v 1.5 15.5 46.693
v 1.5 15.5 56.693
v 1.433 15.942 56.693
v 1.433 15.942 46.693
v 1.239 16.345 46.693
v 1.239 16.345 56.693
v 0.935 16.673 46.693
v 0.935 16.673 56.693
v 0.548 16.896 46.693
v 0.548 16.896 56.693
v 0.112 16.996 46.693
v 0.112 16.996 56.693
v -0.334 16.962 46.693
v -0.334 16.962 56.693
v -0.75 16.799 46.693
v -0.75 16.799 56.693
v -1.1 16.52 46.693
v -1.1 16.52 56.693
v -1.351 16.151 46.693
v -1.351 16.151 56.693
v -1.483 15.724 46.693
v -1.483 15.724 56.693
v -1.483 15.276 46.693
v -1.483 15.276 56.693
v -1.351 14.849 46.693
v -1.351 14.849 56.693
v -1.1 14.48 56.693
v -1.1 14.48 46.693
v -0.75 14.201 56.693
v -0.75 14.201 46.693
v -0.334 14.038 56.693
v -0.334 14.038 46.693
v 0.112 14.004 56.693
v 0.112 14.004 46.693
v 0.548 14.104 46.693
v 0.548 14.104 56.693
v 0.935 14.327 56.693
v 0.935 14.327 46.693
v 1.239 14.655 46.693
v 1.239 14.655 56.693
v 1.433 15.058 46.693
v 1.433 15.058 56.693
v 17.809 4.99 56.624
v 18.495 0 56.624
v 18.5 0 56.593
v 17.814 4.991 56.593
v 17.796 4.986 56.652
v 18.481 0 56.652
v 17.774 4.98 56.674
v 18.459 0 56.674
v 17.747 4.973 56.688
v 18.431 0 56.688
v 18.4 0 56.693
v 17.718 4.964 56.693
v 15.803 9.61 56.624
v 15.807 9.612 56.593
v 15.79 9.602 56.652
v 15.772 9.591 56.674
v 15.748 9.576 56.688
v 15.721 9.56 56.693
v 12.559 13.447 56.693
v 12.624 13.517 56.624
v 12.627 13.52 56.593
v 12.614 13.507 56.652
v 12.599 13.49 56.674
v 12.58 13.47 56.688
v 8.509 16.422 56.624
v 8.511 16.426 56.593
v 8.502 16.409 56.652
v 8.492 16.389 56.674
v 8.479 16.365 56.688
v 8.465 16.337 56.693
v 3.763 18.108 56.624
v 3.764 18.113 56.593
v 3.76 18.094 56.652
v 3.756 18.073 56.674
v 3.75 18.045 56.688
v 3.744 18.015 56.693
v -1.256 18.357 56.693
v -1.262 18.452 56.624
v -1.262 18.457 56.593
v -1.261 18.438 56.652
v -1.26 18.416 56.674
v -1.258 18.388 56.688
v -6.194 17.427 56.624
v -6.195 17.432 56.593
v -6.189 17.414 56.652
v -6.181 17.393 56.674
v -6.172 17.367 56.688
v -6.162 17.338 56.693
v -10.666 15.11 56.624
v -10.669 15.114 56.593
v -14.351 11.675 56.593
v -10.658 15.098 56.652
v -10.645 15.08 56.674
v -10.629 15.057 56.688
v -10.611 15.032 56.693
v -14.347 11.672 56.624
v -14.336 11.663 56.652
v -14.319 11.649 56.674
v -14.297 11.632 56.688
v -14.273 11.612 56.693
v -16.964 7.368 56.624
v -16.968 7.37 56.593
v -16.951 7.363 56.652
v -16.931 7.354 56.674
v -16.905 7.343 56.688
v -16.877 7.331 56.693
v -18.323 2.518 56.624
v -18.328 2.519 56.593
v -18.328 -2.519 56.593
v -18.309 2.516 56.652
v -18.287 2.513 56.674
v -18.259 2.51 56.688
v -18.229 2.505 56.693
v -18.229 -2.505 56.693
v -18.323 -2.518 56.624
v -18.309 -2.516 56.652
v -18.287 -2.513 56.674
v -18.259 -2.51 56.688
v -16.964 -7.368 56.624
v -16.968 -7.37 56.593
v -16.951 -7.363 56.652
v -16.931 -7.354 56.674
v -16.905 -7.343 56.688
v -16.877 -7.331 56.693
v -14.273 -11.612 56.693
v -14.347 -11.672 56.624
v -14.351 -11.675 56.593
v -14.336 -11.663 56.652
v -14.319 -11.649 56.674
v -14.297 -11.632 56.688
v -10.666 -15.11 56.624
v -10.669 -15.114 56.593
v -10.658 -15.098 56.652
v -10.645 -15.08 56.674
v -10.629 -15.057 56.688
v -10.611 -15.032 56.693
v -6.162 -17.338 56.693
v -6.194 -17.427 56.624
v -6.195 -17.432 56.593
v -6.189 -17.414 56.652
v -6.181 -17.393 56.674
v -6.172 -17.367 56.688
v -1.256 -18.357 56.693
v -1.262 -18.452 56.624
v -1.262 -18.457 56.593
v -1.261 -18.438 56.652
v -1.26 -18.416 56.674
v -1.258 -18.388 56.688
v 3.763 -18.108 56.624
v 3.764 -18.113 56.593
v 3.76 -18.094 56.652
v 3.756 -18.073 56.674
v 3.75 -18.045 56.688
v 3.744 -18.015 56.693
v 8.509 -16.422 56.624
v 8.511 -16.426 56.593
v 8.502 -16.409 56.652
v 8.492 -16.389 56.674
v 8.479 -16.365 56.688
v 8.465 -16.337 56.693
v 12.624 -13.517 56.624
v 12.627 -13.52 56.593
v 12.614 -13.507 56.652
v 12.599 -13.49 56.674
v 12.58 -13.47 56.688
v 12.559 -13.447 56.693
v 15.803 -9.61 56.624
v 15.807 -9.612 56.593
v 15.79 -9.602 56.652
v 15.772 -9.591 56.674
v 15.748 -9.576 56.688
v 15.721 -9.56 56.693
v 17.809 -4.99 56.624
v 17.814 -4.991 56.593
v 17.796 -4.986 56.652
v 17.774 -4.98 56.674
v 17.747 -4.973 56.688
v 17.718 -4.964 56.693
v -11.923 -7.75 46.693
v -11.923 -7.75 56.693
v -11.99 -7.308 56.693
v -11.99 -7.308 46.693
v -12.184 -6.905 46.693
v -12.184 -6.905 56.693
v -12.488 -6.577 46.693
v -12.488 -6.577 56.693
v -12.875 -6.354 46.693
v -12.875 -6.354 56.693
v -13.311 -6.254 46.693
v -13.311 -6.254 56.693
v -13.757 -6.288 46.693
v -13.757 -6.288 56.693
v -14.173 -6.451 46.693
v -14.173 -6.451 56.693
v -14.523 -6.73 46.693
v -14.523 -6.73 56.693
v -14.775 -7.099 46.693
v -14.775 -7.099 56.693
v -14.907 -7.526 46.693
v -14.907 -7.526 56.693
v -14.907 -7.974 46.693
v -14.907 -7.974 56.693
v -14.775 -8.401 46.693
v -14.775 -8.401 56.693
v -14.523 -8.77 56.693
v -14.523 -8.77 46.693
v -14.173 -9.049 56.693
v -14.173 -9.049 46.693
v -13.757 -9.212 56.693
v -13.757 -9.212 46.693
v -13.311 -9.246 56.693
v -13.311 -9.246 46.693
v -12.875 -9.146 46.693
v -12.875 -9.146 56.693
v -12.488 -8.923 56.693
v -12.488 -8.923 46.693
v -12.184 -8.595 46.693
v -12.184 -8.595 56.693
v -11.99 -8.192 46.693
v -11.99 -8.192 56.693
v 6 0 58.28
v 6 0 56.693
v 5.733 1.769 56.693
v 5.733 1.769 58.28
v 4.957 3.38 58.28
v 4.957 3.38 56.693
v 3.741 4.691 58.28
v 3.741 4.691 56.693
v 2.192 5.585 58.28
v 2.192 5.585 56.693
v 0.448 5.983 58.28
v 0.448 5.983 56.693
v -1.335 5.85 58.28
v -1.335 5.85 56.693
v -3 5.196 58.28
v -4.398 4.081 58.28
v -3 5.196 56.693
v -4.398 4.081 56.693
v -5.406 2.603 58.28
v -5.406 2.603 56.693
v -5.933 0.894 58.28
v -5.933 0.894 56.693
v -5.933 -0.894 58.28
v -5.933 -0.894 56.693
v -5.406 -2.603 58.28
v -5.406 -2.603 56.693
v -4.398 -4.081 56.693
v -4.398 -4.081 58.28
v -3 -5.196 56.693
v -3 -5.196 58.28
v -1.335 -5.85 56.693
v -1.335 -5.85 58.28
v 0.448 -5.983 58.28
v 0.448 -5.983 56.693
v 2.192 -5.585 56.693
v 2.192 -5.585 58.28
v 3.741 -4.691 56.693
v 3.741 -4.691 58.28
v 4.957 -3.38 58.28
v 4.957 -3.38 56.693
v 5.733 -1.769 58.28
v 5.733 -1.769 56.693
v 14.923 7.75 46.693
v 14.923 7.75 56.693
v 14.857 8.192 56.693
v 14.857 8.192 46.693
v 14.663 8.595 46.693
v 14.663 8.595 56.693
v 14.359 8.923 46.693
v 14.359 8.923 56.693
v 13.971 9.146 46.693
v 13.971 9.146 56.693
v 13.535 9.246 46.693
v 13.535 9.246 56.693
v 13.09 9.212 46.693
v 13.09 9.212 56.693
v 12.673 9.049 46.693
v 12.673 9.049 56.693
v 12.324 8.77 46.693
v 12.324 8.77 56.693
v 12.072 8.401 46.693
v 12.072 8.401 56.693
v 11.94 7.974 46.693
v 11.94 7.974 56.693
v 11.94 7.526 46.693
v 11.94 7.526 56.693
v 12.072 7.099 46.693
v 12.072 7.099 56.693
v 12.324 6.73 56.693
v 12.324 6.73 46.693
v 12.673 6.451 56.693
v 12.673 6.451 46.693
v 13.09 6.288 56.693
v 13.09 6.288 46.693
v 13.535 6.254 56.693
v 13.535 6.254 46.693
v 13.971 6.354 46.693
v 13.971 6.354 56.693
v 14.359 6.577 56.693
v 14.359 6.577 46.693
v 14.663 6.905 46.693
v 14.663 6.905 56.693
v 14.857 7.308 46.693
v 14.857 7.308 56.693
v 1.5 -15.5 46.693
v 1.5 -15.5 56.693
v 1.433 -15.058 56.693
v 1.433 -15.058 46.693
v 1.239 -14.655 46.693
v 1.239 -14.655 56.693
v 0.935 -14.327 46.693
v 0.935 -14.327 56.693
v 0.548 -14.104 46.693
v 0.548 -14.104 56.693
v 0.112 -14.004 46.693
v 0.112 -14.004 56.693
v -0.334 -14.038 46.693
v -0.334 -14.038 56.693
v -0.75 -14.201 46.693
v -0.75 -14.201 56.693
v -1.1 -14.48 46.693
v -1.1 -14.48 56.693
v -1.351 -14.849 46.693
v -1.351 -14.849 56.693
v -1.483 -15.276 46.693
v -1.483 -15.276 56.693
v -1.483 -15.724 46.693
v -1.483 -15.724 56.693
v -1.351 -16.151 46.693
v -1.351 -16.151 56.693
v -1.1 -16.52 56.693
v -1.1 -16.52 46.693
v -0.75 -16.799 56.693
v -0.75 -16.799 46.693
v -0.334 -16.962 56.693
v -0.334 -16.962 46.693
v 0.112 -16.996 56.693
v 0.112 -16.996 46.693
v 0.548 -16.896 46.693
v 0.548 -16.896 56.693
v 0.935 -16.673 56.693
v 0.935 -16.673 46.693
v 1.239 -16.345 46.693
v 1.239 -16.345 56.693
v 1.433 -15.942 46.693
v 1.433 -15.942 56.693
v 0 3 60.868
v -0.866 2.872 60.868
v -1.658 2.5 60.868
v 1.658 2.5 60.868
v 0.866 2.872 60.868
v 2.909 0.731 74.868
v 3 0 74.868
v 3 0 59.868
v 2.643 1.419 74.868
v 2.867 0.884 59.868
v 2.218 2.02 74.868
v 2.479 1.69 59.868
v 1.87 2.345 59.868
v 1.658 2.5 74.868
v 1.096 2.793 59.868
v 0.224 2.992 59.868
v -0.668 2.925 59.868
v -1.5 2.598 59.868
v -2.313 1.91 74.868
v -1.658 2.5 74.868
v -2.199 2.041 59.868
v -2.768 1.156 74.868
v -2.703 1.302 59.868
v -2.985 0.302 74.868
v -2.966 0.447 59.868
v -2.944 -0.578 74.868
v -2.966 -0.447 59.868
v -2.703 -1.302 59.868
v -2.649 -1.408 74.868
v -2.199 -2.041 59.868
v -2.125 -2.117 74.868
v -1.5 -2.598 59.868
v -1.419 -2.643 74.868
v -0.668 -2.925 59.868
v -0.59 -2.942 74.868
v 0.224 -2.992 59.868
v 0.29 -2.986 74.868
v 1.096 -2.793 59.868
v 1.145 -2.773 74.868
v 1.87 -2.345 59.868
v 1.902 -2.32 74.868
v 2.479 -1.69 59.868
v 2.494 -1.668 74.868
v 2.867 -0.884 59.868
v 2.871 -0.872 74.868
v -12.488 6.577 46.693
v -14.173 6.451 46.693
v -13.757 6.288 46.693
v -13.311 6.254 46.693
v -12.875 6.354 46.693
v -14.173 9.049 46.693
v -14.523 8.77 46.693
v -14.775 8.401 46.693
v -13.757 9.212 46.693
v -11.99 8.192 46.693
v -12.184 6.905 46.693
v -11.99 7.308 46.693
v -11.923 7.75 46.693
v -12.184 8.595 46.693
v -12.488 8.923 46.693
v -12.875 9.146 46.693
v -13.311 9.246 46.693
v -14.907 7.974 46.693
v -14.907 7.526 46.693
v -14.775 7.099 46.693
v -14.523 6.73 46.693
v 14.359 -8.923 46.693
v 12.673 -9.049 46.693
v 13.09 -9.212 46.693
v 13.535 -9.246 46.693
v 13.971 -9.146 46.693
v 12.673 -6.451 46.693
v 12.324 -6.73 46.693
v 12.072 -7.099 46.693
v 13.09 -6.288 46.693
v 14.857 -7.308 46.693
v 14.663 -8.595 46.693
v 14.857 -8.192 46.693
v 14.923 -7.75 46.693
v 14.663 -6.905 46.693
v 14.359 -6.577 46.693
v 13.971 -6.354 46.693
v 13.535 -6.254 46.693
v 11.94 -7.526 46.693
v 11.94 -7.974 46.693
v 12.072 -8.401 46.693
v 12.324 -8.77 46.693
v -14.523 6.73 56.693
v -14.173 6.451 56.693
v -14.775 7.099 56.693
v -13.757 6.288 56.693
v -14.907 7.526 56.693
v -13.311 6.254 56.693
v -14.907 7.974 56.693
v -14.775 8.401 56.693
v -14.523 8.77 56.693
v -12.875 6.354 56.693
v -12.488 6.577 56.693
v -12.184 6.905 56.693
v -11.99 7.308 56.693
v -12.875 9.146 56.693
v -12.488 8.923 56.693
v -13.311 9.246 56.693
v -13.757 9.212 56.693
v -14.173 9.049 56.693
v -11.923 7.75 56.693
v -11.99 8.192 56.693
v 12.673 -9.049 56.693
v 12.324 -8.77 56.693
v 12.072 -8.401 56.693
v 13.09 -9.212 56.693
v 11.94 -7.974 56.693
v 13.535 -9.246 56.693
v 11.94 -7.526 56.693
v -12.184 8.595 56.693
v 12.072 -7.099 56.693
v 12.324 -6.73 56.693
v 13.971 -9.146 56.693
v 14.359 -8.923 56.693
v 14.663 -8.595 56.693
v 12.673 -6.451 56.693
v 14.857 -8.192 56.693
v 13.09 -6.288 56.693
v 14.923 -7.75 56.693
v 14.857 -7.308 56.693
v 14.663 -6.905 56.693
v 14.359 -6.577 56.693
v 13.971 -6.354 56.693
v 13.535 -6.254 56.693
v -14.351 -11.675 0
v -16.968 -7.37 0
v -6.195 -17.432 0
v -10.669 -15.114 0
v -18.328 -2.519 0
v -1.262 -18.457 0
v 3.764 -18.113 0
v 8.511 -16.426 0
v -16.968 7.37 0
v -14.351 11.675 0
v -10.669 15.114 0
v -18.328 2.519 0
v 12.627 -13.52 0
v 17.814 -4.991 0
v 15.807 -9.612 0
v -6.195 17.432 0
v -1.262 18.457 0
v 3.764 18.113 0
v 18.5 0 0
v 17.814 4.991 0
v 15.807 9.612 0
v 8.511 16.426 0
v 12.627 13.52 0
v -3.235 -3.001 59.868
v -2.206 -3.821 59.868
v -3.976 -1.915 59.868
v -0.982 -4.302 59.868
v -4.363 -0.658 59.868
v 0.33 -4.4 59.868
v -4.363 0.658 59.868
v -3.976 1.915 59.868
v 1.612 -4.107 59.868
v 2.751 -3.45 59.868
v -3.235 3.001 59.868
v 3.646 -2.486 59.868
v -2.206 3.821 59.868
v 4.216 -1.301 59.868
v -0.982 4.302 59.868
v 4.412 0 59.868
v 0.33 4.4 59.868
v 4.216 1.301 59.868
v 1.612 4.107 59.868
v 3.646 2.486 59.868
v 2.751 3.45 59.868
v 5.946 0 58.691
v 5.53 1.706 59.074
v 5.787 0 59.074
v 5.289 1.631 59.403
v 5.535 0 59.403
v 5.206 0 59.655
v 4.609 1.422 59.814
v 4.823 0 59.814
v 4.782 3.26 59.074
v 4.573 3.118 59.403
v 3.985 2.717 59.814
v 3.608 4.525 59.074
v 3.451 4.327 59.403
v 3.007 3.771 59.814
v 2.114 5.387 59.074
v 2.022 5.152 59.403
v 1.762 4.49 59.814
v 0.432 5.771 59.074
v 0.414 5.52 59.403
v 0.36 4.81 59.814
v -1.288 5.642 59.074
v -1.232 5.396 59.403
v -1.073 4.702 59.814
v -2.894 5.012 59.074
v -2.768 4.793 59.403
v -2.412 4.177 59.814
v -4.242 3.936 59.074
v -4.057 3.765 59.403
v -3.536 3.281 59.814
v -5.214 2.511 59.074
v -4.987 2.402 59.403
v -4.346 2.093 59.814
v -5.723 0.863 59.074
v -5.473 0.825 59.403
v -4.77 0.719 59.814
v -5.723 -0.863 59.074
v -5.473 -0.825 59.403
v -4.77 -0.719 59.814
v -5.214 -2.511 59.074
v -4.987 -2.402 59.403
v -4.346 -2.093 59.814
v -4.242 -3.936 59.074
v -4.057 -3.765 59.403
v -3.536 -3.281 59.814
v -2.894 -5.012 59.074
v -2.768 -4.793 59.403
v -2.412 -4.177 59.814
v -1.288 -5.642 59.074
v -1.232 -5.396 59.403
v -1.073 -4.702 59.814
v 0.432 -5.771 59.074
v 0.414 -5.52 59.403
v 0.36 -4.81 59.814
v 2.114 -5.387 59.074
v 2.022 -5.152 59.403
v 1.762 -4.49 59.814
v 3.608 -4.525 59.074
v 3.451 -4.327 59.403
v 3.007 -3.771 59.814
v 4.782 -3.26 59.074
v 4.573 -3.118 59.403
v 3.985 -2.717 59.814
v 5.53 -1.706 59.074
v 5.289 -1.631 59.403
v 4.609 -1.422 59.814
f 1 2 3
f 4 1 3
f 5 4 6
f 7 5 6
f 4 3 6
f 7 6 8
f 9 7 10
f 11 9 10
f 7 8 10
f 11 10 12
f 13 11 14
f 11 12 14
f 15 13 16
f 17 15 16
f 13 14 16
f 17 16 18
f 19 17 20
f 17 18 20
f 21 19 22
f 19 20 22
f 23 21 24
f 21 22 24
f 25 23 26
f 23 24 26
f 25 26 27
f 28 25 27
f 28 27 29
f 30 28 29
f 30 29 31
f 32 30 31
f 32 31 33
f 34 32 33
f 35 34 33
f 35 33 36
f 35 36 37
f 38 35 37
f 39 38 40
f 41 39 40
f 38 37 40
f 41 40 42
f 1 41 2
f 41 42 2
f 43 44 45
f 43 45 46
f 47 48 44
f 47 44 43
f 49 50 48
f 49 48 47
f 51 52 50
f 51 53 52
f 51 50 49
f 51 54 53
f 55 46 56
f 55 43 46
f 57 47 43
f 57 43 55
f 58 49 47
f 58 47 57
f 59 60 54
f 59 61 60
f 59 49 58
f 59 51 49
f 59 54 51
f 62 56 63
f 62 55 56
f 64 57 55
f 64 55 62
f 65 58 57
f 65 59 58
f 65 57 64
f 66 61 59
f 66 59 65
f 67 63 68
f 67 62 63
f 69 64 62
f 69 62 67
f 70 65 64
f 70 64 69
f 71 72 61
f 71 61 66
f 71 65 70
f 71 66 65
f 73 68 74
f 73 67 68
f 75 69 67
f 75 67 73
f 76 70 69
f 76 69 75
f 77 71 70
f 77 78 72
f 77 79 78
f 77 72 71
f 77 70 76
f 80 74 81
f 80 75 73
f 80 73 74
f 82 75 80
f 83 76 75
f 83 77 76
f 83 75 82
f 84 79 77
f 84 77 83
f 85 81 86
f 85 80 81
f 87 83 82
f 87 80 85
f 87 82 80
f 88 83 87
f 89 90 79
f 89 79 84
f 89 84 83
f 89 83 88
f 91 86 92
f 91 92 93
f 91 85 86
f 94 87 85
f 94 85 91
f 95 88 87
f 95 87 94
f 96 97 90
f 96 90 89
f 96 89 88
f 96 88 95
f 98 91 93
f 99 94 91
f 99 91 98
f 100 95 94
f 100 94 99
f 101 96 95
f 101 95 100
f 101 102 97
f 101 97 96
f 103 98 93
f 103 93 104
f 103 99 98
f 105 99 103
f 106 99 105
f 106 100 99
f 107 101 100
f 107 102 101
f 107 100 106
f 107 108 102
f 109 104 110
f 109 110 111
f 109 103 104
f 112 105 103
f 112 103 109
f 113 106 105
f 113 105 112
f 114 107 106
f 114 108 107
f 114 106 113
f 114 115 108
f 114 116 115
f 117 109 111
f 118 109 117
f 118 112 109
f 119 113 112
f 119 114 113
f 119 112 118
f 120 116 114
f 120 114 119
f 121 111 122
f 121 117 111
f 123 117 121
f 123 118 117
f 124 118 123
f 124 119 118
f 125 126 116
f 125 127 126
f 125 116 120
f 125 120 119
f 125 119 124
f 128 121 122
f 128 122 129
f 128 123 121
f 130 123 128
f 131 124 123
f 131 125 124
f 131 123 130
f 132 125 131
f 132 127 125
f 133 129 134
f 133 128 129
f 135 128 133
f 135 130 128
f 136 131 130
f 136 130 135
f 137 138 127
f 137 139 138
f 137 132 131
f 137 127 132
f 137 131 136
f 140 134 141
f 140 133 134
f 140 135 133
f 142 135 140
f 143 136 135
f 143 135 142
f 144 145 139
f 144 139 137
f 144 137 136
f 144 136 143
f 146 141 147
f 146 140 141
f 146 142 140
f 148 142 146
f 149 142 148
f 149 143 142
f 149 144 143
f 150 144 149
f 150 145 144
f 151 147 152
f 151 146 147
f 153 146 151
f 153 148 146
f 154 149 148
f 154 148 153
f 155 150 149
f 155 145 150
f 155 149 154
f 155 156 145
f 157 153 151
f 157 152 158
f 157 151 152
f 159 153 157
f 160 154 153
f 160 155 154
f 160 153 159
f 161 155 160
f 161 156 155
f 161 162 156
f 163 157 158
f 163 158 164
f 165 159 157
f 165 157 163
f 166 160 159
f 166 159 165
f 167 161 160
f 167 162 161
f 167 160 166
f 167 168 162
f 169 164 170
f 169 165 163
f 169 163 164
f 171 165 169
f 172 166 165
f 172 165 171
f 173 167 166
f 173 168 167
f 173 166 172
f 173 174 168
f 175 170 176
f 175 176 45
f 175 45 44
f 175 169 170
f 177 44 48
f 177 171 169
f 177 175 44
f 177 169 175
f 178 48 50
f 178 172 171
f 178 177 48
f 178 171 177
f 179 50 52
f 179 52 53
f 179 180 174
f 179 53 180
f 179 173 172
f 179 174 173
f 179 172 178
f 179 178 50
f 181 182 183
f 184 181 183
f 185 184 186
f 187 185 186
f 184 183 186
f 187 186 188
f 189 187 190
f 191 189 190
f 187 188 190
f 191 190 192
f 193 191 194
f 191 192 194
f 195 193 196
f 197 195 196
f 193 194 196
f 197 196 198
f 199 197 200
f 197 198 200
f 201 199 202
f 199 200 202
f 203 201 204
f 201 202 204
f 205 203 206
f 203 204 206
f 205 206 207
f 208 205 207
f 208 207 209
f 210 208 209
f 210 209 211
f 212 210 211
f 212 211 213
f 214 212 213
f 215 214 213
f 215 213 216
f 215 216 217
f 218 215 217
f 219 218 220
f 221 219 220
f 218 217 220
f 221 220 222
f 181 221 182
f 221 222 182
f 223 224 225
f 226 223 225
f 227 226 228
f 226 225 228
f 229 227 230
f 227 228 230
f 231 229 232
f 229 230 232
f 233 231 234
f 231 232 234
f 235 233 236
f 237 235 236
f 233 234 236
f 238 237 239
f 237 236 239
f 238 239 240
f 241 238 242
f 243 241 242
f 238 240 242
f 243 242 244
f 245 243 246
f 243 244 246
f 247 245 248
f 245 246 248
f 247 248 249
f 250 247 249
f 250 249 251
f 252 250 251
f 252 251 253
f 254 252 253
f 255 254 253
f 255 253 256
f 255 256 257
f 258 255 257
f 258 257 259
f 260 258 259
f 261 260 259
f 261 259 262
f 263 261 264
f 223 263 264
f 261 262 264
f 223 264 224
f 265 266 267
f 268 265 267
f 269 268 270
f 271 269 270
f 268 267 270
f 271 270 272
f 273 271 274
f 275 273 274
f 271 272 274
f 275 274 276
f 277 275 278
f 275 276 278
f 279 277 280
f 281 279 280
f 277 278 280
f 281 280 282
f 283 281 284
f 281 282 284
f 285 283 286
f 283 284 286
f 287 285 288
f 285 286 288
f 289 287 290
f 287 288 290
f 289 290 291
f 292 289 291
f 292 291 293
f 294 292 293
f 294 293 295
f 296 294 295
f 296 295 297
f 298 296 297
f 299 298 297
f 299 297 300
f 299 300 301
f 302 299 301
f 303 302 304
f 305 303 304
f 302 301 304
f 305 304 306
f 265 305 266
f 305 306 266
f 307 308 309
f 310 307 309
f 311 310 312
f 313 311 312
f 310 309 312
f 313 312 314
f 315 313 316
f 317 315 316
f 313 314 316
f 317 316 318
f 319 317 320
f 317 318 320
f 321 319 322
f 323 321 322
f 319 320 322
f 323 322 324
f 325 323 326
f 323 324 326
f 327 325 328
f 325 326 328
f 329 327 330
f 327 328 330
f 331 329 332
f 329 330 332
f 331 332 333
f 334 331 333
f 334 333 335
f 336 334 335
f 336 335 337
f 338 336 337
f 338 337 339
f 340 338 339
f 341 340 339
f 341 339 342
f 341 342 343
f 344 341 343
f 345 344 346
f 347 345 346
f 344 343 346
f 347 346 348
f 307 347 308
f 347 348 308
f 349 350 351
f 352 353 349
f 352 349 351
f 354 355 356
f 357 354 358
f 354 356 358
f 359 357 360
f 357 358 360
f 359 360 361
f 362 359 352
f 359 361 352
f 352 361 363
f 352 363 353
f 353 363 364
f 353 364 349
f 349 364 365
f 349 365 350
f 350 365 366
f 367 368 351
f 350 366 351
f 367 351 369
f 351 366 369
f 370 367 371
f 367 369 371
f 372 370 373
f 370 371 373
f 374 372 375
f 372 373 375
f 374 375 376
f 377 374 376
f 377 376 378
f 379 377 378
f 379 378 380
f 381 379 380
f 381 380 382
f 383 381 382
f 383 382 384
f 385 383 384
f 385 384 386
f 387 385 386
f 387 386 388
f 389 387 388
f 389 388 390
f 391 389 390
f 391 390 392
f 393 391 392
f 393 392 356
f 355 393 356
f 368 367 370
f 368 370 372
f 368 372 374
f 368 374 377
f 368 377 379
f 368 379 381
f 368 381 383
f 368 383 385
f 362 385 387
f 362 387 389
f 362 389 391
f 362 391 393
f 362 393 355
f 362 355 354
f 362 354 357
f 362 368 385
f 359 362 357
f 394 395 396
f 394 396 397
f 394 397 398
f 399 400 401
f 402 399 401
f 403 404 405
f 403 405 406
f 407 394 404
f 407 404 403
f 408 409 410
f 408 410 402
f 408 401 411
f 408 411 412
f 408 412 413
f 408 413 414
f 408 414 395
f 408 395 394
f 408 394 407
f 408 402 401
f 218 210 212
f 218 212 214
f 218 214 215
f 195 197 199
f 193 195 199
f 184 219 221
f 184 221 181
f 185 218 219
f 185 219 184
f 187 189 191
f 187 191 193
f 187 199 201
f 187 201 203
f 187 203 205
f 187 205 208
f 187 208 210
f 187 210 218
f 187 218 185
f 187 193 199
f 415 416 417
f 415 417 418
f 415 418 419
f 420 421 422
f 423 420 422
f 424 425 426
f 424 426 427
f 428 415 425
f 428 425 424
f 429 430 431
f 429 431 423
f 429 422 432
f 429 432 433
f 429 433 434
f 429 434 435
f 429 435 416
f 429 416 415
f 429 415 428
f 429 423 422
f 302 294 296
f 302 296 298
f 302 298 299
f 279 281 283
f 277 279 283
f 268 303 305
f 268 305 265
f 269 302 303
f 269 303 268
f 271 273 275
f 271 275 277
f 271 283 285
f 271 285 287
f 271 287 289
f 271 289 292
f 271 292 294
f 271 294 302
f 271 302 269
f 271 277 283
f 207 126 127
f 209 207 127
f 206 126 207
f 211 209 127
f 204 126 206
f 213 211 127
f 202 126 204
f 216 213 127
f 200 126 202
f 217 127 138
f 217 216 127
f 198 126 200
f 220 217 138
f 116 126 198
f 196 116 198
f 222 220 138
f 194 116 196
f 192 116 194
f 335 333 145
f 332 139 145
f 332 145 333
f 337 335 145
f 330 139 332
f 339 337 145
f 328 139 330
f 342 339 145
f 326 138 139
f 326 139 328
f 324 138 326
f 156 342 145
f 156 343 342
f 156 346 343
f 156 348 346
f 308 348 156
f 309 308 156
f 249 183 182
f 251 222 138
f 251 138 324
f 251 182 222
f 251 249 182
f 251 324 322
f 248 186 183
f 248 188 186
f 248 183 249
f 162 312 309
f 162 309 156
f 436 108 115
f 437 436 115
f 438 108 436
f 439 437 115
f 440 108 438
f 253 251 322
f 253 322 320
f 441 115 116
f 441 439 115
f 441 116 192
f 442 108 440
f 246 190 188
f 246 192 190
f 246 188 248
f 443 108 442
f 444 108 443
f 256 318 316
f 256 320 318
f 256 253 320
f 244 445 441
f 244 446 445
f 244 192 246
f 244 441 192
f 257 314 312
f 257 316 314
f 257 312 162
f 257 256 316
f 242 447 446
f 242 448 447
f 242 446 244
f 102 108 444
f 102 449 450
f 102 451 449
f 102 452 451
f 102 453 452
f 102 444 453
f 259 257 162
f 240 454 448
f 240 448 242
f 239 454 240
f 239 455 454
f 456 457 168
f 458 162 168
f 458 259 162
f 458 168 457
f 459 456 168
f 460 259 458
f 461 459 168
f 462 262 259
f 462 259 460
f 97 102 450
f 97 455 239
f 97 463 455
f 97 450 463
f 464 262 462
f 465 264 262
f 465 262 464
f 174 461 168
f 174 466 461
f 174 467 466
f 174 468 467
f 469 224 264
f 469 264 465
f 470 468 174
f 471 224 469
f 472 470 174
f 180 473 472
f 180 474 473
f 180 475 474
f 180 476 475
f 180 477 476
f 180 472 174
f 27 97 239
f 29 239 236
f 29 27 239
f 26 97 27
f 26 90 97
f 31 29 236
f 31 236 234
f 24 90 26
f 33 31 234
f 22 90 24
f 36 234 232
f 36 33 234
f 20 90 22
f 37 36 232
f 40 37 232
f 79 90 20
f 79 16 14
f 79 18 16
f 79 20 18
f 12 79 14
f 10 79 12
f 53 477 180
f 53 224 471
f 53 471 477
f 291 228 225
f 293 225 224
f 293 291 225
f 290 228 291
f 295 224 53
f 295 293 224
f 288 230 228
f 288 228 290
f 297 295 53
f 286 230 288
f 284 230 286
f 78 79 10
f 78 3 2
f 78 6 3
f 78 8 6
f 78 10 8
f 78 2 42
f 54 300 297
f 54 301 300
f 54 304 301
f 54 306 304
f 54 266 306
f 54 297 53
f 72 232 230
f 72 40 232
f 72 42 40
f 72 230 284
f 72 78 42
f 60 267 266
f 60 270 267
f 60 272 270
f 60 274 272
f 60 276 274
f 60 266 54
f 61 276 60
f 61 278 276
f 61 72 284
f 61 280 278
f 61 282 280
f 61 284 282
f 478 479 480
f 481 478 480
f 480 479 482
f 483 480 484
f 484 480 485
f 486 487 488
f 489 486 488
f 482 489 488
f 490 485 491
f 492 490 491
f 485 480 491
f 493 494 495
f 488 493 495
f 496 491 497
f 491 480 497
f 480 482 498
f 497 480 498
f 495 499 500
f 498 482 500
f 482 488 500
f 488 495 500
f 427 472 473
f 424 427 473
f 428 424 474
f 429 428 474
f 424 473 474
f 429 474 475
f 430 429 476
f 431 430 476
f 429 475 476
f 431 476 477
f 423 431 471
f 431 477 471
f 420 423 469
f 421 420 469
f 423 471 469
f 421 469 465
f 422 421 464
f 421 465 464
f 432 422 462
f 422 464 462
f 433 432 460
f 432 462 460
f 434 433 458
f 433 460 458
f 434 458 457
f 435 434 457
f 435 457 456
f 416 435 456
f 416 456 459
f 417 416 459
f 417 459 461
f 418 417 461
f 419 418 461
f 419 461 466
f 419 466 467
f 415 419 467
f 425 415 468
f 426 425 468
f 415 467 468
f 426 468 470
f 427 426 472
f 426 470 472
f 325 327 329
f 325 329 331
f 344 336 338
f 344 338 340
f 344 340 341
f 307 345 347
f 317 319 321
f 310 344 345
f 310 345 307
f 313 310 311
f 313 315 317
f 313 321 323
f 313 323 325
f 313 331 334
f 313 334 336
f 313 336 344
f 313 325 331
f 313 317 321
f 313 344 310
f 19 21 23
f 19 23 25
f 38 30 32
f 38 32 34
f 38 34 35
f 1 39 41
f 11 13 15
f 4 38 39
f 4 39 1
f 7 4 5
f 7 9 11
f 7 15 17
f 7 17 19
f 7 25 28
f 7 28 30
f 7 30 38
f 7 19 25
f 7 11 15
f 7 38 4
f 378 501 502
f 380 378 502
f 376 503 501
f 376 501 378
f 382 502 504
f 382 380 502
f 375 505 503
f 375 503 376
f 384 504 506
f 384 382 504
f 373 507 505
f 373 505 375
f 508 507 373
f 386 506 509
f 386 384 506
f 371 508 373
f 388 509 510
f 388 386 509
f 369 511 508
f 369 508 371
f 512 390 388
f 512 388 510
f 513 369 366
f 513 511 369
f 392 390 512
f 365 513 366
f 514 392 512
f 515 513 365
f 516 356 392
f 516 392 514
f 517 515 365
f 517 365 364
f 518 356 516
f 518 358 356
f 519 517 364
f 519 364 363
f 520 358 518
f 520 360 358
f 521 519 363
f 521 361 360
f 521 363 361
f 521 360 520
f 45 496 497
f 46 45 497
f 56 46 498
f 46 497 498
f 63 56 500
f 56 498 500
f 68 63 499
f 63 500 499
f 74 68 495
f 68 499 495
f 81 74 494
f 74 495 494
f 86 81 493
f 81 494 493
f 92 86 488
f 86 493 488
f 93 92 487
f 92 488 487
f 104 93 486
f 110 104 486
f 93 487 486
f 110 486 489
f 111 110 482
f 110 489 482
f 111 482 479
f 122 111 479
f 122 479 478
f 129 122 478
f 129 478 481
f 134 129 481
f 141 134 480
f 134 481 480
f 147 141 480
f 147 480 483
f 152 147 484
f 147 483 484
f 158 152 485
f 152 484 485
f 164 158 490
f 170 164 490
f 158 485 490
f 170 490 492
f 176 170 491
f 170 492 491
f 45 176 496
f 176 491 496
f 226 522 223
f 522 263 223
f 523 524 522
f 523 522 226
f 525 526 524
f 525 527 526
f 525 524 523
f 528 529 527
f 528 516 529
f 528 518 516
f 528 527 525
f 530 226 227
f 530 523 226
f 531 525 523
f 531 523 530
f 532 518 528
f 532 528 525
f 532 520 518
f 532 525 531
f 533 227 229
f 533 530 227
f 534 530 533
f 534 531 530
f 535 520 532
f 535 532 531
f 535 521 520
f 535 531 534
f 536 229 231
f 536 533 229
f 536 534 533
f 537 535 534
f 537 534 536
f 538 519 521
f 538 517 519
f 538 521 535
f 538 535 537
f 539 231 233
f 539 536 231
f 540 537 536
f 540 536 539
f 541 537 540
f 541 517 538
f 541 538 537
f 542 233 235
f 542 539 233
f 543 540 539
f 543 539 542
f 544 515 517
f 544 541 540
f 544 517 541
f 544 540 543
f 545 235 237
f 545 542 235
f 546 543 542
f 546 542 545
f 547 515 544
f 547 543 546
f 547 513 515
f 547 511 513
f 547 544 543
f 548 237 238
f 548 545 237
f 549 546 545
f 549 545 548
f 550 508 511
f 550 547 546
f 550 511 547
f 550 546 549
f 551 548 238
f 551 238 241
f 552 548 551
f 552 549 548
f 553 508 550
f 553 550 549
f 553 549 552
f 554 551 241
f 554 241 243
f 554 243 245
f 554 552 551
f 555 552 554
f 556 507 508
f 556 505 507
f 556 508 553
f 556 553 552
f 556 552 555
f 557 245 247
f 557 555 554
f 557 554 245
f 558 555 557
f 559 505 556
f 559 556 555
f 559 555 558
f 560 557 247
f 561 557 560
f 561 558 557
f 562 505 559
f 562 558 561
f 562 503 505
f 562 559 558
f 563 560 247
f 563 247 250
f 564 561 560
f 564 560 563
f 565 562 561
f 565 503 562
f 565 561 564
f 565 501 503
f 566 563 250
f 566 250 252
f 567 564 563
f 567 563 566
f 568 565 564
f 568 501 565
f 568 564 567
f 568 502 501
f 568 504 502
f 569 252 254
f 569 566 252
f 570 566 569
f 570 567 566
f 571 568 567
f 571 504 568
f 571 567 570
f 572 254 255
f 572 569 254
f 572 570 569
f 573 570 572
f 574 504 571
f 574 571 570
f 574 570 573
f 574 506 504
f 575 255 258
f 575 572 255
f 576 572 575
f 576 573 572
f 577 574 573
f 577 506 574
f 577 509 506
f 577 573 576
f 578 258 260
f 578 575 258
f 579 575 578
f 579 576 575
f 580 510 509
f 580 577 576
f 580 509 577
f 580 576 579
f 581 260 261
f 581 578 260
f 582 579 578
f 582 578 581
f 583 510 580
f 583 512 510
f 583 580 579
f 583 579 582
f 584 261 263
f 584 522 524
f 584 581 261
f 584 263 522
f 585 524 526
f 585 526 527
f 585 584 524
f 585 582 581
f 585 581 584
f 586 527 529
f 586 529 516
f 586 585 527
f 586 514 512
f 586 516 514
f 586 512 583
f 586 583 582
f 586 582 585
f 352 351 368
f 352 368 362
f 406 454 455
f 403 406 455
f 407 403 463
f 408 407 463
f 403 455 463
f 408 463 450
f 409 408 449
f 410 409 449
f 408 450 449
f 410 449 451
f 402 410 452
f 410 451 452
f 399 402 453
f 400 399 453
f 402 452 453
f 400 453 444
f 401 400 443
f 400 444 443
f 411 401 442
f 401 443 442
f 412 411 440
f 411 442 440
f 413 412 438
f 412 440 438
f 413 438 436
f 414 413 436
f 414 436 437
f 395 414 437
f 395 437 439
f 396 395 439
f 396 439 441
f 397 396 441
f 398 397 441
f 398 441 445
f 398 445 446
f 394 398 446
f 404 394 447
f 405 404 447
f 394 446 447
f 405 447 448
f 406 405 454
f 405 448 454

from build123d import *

# Parameters (mm, degrees)
SKETCH1_R           = 18.5
BOSS_EXTRUDE1_DEPTH = 56.6928
FILLET3_R           = 0.1
SKETCH2_R           = 6
BOSS_EXTRUDE2_DEPTH = 3.175
FILLET2_R           = 1.5875
SKETCH5_R           = 3
BOSS_EXTRUDE3_DEPTH = 15
CUT_EXTRUDE1_START  = -14
CUT_EXTRUDE1_DEPTH  = 14
SKETCH7_R           = 1.5
CUT_EXTRUDE2_DEPTH  = 10


with BuildPart() as part:
    # Sketch1 → Boss-Extrude1 (new body)
    with BuildSketch(Plane.XY):
        Circle(SKETCH1_R)
    extrude(amount=BOSS_EXTRUDE1_DEPTH)

    # Fillet3
    fillet3_edges = [part.edges().sort_by_distance(p)[0] for p in [
        (-18.5, 0, 56.6928),
    ]]
    fillet(fillet3_edges, radius=FILLET3_R)

    # Sketch2 → Boss-Extrude2 (add)
    with BuildSketch(Plane.XY.offset(56.6928)):
        Circle(SKETCH2_R)
    extrude(amount=BOSS_EXTRUDE2_DEPTH)

    # Fillet2
    fillet2_edges = [part.edges().sort_by_distance(p)[0] for p in [
        (-6, 0, 59.8678),
    ]]
    fillet(fillet2_edges, radius=FILLET2_R)

    # Sketch5 → Boss-Extrude3 (add)
    with BuildSketch(Plane.XY.offset(59.8678)):
        Circle(SKETCH5_R)
    extrude(amount=BOSS_EXTRUDE3_DEPTH)

    # Sketch6 → Cut-Extrude1 (cut)
    with BuildSketch(Plane.XY.offset(74.8678).offset(CUT_EXTRUDE1_START)):
        with BuildLine():
            Line((-1.658312395, 2.5), (1.658312395, 2.5))
            ThreePointArc((1.658312395, 2.5), (0, 3), (-1.658312395, 2.5))
        make_face()
    extrude(amount=CUT_EXTRUDE1_DEPTH, mode=Mode.SUBTRACT)

    # Sketch7 → Cut-Extrude2 (cut)
    with BuildSketch(Plane.XY.offset(56.6928)):
        with Locations((0, 15.5)):
            Circle(SKETCH7_R)
        with Locations((13.423393759, 7.75)):
            Circle(SKETCH7_R)
        with Locations((13.423393759, -7.75)):
            Circle(SKETCH7_R)
        with Locations((0, -15.5)):
            Circle(SKETCH7_R)
        with Locations((-13.423393759, -7.75)):
            Circle(SKETCH7_R)
        with Locations((-13.423393759, 7.75)):
            Circle(SKETCH7_R)
    extrude(amount=-CUT_EXTRUDE2_DEPTH, mode=Mode.SUBTRACT)


solid = part.part
